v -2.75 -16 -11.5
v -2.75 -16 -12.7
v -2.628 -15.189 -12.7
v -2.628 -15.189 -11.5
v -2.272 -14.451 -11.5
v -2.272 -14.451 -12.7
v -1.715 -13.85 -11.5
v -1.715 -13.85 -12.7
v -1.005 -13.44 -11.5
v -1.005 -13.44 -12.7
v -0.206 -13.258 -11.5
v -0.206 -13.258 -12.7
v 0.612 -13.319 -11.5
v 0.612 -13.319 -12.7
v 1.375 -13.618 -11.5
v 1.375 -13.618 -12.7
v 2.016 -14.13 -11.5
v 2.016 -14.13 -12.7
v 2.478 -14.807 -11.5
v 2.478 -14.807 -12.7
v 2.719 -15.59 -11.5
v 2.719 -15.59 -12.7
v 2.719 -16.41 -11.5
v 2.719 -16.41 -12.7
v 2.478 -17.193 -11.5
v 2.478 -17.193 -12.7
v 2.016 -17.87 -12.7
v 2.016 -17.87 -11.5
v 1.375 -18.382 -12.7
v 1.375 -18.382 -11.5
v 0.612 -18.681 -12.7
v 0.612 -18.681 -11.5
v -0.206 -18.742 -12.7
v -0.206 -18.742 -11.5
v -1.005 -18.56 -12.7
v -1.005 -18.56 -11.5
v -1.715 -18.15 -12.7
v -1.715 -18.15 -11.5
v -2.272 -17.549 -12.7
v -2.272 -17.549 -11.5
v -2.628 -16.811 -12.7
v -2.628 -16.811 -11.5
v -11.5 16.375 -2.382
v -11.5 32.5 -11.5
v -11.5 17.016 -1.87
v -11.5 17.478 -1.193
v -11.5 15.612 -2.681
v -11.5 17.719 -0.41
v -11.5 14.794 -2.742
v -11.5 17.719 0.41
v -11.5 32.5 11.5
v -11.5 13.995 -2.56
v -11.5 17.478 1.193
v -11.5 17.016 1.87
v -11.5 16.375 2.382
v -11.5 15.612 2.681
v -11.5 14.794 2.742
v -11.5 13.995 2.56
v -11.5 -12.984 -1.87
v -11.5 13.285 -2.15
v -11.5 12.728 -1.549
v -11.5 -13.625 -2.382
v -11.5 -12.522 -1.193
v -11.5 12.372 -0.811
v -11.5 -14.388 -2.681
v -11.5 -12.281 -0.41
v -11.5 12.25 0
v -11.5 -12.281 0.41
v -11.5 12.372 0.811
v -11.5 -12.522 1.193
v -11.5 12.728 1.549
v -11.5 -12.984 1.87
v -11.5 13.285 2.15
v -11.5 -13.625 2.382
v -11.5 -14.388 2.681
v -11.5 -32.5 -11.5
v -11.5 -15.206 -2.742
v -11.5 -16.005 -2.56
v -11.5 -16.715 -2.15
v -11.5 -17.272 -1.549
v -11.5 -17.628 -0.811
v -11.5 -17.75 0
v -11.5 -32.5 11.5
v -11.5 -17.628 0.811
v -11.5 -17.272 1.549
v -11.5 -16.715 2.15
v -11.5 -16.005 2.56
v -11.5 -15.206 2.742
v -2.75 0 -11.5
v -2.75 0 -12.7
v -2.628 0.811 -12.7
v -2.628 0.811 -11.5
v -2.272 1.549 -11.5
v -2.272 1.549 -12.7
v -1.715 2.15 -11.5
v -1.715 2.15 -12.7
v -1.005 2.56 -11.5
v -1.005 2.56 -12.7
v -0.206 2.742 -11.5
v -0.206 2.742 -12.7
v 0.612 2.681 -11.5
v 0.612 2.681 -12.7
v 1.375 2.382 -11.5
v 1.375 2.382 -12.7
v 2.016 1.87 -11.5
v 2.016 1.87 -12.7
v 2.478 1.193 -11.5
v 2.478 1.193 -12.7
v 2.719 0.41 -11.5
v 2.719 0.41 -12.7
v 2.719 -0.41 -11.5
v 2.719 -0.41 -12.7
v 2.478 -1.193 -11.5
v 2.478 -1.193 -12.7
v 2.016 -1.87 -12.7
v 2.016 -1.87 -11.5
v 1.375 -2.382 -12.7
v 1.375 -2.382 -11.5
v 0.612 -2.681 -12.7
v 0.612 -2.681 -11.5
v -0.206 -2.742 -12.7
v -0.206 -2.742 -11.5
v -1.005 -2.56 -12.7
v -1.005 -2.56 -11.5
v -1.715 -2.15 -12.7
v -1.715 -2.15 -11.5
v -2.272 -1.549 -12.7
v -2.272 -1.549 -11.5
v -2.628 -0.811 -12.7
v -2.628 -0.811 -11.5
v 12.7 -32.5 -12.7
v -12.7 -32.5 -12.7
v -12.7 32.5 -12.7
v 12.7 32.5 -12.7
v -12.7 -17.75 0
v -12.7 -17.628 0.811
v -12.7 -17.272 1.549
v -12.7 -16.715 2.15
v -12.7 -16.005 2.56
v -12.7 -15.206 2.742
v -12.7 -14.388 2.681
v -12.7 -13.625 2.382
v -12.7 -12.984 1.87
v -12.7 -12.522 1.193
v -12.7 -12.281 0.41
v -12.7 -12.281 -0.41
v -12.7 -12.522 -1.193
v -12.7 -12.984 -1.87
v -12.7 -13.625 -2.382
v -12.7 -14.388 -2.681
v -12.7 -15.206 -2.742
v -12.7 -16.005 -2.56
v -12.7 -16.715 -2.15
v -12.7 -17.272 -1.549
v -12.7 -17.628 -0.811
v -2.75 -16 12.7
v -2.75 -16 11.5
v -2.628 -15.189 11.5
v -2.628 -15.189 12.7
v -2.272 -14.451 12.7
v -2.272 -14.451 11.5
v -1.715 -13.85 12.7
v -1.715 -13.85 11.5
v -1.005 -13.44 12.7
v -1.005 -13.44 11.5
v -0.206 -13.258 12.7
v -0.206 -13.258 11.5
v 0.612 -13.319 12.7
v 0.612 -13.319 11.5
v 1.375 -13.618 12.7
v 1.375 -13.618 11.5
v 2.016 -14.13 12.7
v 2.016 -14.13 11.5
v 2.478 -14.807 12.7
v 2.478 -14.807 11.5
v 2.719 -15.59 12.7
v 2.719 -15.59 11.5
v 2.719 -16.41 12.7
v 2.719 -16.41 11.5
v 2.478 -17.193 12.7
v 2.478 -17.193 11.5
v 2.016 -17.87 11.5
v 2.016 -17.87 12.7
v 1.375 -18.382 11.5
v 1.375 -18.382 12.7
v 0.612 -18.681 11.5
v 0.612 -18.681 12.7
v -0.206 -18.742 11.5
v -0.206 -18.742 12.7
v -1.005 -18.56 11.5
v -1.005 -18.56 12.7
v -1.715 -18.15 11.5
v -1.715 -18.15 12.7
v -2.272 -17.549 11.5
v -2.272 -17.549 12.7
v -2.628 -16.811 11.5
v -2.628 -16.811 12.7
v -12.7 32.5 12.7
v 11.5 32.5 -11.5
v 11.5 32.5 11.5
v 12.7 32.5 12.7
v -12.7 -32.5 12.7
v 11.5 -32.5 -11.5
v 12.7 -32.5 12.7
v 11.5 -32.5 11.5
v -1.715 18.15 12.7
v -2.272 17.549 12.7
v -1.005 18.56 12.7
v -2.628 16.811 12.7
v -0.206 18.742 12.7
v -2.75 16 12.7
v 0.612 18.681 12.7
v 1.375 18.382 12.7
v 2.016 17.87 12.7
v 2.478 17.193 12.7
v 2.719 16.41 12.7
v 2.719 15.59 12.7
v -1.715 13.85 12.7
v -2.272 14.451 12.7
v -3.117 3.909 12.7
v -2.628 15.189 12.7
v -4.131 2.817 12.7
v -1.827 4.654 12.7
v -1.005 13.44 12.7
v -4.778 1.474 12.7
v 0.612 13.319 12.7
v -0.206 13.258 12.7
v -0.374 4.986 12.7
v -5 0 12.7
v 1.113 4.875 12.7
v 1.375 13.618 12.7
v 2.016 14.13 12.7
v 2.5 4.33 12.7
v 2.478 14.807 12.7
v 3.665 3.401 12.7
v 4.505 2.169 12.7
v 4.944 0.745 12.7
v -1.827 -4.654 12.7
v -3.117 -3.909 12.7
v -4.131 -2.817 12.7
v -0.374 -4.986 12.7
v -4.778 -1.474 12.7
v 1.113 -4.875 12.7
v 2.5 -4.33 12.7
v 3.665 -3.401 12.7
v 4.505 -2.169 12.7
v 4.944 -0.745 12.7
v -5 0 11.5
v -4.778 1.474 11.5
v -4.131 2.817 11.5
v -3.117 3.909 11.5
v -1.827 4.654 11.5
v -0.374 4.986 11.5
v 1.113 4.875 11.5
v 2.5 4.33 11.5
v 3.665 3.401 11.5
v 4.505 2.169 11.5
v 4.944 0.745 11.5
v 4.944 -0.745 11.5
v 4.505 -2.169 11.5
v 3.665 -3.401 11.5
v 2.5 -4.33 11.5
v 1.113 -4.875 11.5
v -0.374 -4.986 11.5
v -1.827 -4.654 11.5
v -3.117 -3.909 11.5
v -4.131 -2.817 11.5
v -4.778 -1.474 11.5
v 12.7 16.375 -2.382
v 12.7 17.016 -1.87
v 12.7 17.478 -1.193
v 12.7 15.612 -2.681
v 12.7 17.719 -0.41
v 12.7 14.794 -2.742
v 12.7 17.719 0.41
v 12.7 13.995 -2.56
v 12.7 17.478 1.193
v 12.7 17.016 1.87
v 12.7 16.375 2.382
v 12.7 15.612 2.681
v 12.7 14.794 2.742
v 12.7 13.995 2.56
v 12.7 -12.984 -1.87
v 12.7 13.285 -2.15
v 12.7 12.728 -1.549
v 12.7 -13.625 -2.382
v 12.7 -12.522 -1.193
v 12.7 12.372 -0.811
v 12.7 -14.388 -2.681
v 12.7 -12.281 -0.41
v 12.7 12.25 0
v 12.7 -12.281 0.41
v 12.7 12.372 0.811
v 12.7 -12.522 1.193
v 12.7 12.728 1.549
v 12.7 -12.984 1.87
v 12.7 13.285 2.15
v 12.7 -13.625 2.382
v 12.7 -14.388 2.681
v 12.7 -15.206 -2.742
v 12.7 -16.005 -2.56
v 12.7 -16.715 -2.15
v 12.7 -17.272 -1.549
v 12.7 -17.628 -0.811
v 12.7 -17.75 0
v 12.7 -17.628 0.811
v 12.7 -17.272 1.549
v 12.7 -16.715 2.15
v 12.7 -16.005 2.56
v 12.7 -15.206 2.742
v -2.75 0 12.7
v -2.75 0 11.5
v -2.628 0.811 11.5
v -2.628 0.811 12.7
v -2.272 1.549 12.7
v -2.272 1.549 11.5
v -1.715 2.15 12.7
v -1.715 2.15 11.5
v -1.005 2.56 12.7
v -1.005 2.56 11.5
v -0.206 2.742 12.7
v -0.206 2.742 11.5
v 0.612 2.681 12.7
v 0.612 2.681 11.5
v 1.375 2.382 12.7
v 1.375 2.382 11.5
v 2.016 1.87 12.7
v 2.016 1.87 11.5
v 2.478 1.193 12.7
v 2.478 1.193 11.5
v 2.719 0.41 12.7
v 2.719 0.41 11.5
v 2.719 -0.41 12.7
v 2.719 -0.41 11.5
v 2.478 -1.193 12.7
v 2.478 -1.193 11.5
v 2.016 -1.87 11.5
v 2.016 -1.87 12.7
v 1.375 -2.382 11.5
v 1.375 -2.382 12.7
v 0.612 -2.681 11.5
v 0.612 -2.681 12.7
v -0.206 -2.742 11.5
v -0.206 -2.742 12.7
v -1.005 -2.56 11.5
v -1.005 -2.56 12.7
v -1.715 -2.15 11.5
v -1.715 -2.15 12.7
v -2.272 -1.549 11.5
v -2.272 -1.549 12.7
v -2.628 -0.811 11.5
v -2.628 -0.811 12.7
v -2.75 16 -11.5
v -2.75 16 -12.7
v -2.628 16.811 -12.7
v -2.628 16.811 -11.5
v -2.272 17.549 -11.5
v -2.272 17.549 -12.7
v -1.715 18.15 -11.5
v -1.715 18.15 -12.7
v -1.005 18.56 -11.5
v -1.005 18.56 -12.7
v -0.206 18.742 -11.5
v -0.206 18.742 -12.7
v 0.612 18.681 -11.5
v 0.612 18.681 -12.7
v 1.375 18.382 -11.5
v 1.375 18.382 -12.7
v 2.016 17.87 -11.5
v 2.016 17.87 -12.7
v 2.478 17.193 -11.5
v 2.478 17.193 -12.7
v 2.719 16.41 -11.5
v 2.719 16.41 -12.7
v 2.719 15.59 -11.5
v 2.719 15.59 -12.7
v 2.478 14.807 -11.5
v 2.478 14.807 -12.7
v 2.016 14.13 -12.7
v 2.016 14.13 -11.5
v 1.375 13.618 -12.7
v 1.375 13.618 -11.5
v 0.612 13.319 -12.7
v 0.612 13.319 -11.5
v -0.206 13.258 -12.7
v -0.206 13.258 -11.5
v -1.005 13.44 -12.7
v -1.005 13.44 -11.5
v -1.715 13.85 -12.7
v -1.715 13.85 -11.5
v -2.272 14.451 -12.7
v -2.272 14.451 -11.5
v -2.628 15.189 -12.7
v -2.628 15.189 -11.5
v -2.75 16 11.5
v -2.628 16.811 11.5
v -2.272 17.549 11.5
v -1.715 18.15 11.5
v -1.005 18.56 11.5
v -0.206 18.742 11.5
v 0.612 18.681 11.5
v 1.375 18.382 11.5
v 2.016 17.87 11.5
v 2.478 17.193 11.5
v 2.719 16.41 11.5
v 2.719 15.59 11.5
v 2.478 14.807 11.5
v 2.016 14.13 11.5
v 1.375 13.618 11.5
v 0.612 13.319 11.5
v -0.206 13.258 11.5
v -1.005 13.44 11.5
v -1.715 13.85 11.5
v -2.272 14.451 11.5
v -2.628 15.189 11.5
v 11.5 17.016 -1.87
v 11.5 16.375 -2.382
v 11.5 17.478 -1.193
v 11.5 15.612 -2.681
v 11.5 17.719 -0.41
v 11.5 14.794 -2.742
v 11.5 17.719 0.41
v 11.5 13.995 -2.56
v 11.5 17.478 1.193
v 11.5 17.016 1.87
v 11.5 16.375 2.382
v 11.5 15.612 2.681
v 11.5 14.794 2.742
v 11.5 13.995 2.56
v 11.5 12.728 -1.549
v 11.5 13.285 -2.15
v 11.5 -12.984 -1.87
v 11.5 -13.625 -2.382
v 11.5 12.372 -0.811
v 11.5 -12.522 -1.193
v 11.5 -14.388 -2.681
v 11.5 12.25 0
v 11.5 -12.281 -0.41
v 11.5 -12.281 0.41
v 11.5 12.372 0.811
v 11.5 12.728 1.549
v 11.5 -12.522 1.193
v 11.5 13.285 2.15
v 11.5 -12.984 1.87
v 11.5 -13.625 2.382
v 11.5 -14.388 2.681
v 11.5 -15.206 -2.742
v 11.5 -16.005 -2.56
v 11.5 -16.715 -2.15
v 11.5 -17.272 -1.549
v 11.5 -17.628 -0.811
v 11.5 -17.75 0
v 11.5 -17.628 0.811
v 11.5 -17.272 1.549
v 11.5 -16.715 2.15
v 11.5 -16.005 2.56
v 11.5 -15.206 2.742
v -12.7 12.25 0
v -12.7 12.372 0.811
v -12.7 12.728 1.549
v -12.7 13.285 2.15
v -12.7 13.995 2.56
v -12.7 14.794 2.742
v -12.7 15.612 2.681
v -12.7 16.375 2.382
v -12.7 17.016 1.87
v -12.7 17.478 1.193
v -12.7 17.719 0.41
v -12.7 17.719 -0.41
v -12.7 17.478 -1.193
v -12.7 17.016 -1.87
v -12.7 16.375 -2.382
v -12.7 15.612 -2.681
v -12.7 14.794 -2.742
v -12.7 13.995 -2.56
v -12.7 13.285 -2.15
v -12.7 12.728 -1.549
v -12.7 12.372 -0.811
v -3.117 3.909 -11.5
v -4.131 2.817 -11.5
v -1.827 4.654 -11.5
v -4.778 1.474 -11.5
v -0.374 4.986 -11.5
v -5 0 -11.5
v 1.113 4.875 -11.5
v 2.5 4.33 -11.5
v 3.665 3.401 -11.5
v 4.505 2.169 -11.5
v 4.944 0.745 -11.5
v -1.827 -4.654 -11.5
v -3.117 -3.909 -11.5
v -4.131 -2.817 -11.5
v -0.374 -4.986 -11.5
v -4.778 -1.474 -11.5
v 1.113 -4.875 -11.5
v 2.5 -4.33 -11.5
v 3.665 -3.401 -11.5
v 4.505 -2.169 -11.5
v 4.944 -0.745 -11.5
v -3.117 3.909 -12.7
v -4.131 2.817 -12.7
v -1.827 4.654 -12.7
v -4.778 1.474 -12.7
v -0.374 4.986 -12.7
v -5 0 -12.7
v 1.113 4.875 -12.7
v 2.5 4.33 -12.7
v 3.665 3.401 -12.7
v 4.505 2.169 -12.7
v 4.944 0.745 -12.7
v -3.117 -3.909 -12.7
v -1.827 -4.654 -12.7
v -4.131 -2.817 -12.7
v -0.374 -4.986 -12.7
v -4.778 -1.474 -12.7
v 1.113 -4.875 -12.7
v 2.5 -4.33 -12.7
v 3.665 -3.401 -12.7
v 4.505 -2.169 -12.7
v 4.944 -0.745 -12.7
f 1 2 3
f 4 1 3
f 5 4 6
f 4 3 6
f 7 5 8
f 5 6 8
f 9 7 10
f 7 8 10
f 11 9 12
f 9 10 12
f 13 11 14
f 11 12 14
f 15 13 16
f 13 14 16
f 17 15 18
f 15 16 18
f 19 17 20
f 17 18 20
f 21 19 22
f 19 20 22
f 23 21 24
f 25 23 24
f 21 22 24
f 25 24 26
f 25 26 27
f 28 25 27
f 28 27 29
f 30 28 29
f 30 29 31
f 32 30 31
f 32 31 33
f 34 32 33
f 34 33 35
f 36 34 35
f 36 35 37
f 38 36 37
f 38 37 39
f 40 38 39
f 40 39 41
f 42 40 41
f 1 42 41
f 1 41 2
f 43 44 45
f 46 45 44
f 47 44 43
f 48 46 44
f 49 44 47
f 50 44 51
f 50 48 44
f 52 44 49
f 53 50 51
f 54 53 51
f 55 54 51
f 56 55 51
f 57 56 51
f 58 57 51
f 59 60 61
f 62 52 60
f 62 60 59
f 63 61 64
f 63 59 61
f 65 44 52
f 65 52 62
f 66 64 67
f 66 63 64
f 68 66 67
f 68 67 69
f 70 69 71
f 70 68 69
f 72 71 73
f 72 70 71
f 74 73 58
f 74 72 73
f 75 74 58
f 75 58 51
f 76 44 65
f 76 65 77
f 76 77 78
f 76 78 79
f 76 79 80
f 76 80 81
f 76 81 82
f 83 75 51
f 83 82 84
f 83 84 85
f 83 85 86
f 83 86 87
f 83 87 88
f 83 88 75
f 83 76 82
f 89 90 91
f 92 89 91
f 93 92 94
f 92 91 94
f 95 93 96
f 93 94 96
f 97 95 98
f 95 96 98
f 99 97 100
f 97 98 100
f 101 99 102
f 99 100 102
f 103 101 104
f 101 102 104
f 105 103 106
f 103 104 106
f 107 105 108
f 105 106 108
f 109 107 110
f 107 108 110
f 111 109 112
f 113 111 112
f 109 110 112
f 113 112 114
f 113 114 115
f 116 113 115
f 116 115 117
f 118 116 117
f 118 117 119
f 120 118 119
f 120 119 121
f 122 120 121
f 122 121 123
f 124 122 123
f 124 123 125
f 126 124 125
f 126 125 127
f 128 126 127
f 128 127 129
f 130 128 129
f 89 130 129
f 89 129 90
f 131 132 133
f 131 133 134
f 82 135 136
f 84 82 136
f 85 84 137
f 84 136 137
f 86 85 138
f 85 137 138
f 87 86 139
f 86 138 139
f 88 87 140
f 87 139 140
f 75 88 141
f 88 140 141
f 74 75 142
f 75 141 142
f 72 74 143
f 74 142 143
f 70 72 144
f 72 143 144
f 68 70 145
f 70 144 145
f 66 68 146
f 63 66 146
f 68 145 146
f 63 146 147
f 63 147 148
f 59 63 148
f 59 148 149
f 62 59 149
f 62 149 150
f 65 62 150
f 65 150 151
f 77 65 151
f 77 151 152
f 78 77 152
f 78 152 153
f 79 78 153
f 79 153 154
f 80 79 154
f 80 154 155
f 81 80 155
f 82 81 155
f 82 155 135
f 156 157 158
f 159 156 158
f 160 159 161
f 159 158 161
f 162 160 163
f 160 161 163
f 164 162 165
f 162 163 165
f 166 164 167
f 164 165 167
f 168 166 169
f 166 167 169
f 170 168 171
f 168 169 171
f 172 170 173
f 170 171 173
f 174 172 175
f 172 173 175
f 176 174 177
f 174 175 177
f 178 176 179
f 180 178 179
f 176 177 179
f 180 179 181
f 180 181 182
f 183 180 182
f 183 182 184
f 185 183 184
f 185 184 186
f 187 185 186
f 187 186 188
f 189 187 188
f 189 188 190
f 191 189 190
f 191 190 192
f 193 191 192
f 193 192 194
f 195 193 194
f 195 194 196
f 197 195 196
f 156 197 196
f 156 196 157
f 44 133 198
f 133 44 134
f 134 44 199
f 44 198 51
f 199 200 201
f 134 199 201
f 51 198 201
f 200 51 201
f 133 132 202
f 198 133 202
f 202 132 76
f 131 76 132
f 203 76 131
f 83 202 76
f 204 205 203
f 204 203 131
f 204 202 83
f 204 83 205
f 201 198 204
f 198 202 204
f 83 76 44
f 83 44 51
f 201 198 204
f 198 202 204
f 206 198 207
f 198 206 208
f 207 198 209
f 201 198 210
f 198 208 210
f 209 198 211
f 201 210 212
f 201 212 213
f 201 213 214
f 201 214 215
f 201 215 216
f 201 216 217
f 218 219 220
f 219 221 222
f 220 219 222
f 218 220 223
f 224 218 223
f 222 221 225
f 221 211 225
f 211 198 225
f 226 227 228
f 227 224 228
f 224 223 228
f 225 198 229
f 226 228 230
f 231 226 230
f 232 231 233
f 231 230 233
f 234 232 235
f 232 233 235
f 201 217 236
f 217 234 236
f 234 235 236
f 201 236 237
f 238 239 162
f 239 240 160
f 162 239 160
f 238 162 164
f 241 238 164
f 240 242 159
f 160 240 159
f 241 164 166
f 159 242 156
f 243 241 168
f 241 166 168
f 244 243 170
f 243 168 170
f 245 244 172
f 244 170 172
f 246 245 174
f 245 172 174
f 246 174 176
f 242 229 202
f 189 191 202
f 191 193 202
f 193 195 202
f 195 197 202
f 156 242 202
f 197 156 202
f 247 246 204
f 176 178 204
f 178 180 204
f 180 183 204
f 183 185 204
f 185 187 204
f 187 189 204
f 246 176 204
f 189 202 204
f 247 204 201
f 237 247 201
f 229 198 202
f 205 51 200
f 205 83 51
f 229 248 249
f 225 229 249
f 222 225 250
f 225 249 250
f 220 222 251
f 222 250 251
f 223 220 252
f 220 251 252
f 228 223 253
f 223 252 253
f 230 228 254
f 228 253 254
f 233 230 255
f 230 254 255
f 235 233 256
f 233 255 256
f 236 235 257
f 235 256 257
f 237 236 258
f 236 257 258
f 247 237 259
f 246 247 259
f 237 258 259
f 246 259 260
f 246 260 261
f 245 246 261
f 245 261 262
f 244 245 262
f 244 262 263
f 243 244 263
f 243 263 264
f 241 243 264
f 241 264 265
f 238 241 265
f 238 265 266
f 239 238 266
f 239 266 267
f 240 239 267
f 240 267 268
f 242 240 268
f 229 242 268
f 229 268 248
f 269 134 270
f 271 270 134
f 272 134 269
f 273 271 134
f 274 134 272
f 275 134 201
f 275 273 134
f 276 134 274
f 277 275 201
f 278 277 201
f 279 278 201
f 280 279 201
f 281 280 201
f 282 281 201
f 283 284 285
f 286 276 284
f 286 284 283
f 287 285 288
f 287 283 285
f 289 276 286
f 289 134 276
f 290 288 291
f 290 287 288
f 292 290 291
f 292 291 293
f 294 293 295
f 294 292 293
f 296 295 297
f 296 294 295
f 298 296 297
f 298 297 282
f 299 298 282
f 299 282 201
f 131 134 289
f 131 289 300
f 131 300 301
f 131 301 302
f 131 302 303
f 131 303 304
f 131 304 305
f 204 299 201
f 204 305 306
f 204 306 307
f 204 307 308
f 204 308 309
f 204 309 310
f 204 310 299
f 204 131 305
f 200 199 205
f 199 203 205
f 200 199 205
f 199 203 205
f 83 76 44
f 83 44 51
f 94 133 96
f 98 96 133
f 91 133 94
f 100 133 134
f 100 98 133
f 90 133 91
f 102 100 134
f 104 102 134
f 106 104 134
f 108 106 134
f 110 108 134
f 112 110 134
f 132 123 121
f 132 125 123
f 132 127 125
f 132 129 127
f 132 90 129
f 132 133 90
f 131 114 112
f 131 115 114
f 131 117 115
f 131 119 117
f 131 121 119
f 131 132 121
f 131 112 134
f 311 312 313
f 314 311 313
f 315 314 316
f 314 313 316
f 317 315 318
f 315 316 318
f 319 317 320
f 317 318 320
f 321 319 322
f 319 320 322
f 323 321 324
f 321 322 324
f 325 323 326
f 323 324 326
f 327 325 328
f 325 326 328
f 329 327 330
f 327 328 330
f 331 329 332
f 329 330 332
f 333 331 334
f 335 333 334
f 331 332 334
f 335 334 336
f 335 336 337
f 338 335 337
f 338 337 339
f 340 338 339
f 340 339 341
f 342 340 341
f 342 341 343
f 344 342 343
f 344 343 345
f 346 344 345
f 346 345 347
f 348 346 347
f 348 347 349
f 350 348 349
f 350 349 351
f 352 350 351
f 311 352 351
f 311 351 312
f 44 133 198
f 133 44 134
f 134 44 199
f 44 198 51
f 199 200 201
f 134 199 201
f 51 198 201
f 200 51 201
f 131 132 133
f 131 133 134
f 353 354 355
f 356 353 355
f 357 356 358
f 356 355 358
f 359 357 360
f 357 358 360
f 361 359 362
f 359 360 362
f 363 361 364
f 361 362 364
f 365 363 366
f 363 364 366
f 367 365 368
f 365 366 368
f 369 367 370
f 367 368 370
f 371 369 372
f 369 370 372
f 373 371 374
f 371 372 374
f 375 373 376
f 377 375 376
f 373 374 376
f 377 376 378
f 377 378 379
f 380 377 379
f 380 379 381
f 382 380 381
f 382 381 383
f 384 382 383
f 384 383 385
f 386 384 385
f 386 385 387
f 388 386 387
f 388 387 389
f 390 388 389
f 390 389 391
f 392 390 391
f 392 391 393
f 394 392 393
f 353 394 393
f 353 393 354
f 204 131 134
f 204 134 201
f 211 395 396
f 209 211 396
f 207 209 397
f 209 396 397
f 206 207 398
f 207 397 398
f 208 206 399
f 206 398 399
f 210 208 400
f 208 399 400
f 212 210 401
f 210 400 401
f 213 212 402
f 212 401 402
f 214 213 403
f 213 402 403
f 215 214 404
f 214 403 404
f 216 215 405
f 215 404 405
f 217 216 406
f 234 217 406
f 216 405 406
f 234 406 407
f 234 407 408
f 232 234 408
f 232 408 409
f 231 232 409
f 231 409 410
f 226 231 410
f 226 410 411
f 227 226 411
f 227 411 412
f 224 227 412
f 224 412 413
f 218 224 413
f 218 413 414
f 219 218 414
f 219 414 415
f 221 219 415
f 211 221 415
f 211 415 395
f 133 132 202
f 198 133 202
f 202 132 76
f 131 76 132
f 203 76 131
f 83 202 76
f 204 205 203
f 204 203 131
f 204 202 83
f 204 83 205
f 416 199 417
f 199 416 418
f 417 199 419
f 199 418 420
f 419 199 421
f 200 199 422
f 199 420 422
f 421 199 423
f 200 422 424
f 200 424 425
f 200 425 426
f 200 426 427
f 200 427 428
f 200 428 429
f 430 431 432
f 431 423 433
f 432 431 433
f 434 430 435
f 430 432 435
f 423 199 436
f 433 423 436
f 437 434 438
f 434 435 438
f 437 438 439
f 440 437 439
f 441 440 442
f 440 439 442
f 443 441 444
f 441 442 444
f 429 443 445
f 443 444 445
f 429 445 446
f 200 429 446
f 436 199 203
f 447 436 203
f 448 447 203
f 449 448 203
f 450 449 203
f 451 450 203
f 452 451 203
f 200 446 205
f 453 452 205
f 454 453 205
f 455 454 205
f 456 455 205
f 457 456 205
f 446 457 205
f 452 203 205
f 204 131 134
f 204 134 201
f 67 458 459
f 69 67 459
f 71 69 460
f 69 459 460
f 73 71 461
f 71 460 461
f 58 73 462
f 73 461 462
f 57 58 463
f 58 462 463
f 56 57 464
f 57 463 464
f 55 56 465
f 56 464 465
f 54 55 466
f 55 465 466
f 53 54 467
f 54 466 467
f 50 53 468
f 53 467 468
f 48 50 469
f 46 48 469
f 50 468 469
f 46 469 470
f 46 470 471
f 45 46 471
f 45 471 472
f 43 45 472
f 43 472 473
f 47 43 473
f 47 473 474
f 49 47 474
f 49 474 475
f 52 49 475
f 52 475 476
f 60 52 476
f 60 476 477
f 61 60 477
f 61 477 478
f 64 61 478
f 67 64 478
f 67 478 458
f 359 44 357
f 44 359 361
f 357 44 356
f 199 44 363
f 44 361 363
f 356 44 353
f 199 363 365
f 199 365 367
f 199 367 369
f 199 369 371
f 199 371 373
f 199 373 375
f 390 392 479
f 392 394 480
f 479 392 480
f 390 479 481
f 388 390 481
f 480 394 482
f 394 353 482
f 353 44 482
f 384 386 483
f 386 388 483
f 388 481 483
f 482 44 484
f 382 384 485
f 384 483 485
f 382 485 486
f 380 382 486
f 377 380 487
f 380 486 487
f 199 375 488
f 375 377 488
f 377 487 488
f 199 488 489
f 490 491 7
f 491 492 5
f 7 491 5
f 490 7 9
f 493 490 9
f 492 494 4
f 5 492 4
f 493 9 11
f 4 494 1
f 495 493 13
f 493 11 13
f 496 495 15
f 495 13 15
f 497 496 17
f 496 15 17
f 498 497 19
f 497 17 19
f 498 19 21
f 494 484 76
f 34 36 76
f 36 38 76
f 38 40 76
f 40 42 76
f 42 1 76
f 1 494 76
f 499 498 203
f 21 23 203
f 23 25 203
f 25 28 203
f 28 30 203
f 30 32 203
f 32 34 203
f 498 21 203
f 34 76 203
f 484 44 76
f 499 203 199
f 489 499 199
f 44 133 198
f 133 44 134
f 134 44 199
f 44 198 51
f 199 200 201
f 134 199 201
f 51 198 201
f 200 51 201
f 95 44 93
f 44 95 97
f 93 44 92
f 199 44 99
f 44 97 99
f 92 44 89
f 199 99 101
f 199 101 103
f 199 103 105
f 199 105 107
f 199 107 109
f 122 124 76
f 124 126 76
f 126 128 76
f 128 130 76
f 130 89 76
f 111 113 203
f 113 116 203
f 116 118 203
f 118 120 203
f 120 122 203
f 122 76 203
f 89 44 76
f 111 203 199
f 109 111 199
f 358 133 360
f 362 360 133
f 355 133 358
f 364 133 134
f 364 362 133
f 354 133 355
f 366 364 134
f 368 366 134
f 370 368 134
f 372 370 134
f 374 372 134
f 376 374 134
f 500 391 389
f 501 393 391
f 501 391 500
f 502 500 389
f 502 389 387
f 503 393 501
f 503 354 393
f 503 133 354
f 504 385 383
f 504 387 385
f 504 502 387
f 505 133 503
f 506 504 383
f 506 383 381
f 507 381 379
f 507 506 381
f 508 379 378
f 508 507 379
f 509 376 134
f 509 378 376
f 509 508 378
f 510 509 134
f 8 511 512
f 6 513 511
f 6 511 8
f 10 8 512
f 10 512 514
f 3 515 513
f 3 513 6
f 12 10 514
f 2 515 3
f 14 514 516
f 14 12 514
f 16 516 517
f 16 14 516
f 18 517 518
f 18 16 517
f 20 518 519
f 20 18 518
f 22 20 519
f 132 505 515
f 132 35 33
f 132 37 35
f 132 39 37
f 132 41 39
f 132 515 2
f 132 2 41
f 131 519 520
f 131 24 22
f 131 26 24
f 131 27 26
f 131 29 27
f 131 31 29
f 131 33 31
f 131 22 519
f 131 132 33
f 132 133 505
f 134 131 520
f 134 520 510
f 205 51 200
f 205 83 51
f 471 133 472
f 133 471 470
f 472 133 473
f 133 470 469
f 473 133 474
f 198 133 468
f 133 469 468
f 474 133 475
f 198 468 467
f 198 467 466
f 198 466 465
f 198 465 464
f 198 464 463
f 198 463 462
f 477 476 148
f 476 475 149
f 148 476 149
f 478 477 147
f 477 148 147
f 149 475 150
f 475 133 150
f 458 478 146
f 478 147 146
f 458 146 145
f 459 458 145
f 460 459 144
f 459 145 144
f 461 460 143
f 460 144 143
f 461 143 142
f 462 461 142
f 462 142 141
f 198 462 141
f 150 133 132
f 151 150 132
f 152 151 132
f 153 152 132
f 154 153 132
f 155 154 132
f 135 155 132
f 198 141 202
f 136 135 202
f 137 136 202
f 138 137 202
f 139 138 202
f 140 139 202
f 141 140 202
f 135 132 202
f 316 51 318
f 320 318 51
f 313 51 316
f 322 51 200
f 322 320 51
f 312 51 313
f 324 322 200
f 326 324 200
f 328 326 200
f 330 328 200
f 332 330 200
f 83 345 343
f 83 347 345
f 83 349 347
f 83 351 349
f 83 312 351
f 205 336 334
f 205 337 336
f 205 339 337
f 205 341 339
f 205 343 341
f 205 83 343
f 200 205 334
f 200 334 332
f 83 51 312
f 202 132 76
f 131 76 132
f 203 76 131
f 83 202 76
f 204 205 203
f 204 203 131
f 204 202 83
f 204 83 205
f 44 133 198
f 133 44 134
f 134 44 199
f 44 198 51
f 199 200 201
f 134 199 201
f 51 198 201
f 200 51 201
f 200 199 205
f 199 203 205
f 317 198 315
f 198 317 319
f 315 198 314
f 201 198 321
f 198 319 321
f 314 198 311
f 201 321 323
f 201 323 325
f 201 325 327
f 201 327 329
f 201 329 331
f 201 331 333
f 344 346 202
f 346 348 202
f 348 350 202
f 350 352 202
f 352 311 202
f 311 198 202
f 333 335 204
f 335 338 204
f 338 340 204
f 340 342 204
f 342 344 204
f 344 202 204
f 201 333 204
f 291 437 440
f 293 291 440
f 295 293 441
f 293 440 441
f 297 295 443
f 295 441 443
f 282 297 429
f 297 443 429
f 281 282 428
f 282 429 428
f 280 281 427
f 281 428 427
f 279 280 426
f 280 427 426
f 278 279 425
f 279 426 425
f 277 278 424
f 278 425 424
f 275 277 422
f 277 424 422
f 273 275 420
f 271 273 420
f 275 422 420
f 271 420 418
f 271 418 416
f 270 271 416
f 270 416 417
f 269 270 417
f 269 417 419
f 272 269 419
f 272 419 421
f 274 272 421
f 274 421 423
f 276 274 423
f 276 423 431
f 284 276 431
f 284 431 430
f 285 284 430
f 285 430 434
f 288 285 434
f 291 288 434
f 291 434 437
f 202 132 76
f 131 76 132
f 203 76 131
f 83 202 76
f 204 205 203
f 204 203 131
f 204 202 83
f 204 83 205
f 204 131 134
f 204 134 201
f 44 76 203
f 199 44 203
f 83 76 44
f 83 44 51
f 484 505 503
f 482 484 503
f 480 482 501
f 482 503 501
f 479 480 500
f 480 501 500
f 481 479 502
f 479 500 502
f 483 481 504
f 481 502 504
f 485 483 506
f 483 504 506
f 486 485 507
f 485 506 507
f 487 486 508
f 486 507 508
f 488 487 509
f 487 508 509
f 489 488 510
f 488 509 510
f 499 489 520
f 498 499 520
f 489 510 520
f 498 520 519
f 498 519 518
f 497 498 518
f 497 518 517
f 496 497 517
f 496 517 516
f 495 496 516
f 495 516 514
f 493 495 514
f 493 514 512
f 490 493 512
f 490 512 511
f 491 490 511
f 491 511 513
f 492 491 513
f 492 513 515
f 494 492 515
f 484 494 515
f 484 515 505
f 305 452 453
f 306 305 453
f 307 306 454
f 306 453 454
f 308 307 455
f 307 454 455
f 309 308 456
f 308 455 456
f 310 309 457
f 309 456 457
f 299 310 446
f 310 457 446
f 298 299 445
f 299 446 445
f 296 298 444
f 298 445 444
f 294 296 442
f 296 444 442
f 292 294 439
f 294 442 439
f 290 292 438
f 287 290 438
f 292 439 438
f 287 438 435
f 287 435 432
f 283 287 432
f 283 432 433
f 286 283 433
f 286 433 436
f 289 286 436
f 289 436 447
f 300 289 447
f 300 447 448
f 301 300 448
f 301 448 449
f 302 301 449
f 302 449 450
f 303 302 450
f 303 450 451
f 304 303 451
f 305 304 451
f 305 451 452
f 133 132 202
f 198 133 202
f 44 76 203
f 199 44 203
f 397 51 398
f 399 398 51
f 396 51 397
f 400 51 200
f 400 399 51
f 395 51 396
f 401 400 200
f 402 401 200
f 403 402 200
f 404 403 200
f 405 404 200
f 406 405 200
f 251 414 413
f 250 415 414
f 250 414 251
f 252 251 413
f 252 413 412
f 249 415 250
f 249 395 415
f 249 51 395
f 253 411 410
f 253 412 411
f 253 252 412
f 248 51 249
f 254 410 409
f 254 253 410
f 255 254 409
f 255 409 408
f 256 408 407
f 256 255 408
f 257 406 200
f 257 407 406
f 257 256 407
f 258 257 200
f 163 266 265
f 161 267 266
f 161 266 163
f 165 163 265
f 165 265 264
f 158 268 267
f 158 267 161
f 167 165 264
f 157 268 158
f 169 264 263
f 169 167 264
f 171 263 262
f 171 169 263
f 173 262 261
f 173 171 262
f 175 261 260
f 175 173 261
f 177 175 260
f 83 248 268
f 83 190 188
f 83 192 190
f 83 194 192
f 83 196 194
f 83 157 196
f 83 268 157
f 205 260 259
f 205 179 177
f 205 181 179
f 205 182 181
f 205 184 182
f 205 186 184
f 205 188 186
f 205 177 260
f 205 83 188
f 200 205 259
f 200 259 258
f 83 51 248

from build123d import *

# Parameters (mm, degrees)
F0_W     = 25.4
F0_H     = 25.4
F0_W_2   = 23
F0_H_2   = 23
F1_DEPTH = 32.5
F2_DEPTH = 32.5
F4_D     = 5.5
F5_D     = 10
F6_DEPTH = 32.5
F8_D     = 5.5
F9_DEPTH = 32.5
F11_D    = 5.5


with BuildPart() as f1:
    # F0 (on Front) → F1 (new body, symmetric)
    with BuildSketch(Plane.XZ):
        Rectangle(F0_W, F0_H)
        Rectangle(F0_W_2, F0_H_2, mode=Mode.SUBTRACT)
    extrude(amount=F1_DEPTH, both=True)


with BuildPart() as f2:
    # F0 (on Front) → F2 (new body, symmetric)
    with BuildSketch(Plane.XZ):
        Rectangle(F0_W, F0_H)
        Rectangle(F0_W_2, F0_H_2, mode=Mode.SUBTRACT)
    extrude(amount=F2_DEPTH, both=True)

    # F4 (through all)
    with Locations(Plane.XY.offset(12.7)):
        with Locations((0, -16), (0, 16)):
            Hole(F4_D / 2)

    # F5 (through all)
    with Locations(Plane.XY.offset(12.7)):
        with Locations((0, 0)):
            Hole(F5_D / 2)


with BuildPart() as f6:
    # F0 (on Front) → F6 (new body, symmetric)
    with BuildSketch(Plane.XZ):
        Rectangle(F0_W, F0_H)
        Rectangle(F0_W_2, F0_H_2, mode=Mode.SUBTRACT)
    extrude(amount=F6_DEPTH, both=True)

    # F8 (through all)
    with Locations(Plane.YZ.offset(12.7)):
        with Locations((-15, 0), (15, 0)):
            Hole(F8_D / 2)


with BuildPart() as f9:
    # F0 (on Front) → F9 (new body, symmetric)
    with BuildSketch(Plane.XZ):
        Rectangle(F0_W, F0_H)
        Rectangle(F0_W_2, F0_H_2, mode=Mode.SUBTRACT)
    extrude(amount=F9_DEPTH, both=True)

    # F11 (through all)
    with Locations(Plane.XY.offset(12.7)):
        with Locations((0, 0)):
            Hole(F11_D / 2)


solid = Compound([f1.part, f2.part, f6.part, f9.part])
